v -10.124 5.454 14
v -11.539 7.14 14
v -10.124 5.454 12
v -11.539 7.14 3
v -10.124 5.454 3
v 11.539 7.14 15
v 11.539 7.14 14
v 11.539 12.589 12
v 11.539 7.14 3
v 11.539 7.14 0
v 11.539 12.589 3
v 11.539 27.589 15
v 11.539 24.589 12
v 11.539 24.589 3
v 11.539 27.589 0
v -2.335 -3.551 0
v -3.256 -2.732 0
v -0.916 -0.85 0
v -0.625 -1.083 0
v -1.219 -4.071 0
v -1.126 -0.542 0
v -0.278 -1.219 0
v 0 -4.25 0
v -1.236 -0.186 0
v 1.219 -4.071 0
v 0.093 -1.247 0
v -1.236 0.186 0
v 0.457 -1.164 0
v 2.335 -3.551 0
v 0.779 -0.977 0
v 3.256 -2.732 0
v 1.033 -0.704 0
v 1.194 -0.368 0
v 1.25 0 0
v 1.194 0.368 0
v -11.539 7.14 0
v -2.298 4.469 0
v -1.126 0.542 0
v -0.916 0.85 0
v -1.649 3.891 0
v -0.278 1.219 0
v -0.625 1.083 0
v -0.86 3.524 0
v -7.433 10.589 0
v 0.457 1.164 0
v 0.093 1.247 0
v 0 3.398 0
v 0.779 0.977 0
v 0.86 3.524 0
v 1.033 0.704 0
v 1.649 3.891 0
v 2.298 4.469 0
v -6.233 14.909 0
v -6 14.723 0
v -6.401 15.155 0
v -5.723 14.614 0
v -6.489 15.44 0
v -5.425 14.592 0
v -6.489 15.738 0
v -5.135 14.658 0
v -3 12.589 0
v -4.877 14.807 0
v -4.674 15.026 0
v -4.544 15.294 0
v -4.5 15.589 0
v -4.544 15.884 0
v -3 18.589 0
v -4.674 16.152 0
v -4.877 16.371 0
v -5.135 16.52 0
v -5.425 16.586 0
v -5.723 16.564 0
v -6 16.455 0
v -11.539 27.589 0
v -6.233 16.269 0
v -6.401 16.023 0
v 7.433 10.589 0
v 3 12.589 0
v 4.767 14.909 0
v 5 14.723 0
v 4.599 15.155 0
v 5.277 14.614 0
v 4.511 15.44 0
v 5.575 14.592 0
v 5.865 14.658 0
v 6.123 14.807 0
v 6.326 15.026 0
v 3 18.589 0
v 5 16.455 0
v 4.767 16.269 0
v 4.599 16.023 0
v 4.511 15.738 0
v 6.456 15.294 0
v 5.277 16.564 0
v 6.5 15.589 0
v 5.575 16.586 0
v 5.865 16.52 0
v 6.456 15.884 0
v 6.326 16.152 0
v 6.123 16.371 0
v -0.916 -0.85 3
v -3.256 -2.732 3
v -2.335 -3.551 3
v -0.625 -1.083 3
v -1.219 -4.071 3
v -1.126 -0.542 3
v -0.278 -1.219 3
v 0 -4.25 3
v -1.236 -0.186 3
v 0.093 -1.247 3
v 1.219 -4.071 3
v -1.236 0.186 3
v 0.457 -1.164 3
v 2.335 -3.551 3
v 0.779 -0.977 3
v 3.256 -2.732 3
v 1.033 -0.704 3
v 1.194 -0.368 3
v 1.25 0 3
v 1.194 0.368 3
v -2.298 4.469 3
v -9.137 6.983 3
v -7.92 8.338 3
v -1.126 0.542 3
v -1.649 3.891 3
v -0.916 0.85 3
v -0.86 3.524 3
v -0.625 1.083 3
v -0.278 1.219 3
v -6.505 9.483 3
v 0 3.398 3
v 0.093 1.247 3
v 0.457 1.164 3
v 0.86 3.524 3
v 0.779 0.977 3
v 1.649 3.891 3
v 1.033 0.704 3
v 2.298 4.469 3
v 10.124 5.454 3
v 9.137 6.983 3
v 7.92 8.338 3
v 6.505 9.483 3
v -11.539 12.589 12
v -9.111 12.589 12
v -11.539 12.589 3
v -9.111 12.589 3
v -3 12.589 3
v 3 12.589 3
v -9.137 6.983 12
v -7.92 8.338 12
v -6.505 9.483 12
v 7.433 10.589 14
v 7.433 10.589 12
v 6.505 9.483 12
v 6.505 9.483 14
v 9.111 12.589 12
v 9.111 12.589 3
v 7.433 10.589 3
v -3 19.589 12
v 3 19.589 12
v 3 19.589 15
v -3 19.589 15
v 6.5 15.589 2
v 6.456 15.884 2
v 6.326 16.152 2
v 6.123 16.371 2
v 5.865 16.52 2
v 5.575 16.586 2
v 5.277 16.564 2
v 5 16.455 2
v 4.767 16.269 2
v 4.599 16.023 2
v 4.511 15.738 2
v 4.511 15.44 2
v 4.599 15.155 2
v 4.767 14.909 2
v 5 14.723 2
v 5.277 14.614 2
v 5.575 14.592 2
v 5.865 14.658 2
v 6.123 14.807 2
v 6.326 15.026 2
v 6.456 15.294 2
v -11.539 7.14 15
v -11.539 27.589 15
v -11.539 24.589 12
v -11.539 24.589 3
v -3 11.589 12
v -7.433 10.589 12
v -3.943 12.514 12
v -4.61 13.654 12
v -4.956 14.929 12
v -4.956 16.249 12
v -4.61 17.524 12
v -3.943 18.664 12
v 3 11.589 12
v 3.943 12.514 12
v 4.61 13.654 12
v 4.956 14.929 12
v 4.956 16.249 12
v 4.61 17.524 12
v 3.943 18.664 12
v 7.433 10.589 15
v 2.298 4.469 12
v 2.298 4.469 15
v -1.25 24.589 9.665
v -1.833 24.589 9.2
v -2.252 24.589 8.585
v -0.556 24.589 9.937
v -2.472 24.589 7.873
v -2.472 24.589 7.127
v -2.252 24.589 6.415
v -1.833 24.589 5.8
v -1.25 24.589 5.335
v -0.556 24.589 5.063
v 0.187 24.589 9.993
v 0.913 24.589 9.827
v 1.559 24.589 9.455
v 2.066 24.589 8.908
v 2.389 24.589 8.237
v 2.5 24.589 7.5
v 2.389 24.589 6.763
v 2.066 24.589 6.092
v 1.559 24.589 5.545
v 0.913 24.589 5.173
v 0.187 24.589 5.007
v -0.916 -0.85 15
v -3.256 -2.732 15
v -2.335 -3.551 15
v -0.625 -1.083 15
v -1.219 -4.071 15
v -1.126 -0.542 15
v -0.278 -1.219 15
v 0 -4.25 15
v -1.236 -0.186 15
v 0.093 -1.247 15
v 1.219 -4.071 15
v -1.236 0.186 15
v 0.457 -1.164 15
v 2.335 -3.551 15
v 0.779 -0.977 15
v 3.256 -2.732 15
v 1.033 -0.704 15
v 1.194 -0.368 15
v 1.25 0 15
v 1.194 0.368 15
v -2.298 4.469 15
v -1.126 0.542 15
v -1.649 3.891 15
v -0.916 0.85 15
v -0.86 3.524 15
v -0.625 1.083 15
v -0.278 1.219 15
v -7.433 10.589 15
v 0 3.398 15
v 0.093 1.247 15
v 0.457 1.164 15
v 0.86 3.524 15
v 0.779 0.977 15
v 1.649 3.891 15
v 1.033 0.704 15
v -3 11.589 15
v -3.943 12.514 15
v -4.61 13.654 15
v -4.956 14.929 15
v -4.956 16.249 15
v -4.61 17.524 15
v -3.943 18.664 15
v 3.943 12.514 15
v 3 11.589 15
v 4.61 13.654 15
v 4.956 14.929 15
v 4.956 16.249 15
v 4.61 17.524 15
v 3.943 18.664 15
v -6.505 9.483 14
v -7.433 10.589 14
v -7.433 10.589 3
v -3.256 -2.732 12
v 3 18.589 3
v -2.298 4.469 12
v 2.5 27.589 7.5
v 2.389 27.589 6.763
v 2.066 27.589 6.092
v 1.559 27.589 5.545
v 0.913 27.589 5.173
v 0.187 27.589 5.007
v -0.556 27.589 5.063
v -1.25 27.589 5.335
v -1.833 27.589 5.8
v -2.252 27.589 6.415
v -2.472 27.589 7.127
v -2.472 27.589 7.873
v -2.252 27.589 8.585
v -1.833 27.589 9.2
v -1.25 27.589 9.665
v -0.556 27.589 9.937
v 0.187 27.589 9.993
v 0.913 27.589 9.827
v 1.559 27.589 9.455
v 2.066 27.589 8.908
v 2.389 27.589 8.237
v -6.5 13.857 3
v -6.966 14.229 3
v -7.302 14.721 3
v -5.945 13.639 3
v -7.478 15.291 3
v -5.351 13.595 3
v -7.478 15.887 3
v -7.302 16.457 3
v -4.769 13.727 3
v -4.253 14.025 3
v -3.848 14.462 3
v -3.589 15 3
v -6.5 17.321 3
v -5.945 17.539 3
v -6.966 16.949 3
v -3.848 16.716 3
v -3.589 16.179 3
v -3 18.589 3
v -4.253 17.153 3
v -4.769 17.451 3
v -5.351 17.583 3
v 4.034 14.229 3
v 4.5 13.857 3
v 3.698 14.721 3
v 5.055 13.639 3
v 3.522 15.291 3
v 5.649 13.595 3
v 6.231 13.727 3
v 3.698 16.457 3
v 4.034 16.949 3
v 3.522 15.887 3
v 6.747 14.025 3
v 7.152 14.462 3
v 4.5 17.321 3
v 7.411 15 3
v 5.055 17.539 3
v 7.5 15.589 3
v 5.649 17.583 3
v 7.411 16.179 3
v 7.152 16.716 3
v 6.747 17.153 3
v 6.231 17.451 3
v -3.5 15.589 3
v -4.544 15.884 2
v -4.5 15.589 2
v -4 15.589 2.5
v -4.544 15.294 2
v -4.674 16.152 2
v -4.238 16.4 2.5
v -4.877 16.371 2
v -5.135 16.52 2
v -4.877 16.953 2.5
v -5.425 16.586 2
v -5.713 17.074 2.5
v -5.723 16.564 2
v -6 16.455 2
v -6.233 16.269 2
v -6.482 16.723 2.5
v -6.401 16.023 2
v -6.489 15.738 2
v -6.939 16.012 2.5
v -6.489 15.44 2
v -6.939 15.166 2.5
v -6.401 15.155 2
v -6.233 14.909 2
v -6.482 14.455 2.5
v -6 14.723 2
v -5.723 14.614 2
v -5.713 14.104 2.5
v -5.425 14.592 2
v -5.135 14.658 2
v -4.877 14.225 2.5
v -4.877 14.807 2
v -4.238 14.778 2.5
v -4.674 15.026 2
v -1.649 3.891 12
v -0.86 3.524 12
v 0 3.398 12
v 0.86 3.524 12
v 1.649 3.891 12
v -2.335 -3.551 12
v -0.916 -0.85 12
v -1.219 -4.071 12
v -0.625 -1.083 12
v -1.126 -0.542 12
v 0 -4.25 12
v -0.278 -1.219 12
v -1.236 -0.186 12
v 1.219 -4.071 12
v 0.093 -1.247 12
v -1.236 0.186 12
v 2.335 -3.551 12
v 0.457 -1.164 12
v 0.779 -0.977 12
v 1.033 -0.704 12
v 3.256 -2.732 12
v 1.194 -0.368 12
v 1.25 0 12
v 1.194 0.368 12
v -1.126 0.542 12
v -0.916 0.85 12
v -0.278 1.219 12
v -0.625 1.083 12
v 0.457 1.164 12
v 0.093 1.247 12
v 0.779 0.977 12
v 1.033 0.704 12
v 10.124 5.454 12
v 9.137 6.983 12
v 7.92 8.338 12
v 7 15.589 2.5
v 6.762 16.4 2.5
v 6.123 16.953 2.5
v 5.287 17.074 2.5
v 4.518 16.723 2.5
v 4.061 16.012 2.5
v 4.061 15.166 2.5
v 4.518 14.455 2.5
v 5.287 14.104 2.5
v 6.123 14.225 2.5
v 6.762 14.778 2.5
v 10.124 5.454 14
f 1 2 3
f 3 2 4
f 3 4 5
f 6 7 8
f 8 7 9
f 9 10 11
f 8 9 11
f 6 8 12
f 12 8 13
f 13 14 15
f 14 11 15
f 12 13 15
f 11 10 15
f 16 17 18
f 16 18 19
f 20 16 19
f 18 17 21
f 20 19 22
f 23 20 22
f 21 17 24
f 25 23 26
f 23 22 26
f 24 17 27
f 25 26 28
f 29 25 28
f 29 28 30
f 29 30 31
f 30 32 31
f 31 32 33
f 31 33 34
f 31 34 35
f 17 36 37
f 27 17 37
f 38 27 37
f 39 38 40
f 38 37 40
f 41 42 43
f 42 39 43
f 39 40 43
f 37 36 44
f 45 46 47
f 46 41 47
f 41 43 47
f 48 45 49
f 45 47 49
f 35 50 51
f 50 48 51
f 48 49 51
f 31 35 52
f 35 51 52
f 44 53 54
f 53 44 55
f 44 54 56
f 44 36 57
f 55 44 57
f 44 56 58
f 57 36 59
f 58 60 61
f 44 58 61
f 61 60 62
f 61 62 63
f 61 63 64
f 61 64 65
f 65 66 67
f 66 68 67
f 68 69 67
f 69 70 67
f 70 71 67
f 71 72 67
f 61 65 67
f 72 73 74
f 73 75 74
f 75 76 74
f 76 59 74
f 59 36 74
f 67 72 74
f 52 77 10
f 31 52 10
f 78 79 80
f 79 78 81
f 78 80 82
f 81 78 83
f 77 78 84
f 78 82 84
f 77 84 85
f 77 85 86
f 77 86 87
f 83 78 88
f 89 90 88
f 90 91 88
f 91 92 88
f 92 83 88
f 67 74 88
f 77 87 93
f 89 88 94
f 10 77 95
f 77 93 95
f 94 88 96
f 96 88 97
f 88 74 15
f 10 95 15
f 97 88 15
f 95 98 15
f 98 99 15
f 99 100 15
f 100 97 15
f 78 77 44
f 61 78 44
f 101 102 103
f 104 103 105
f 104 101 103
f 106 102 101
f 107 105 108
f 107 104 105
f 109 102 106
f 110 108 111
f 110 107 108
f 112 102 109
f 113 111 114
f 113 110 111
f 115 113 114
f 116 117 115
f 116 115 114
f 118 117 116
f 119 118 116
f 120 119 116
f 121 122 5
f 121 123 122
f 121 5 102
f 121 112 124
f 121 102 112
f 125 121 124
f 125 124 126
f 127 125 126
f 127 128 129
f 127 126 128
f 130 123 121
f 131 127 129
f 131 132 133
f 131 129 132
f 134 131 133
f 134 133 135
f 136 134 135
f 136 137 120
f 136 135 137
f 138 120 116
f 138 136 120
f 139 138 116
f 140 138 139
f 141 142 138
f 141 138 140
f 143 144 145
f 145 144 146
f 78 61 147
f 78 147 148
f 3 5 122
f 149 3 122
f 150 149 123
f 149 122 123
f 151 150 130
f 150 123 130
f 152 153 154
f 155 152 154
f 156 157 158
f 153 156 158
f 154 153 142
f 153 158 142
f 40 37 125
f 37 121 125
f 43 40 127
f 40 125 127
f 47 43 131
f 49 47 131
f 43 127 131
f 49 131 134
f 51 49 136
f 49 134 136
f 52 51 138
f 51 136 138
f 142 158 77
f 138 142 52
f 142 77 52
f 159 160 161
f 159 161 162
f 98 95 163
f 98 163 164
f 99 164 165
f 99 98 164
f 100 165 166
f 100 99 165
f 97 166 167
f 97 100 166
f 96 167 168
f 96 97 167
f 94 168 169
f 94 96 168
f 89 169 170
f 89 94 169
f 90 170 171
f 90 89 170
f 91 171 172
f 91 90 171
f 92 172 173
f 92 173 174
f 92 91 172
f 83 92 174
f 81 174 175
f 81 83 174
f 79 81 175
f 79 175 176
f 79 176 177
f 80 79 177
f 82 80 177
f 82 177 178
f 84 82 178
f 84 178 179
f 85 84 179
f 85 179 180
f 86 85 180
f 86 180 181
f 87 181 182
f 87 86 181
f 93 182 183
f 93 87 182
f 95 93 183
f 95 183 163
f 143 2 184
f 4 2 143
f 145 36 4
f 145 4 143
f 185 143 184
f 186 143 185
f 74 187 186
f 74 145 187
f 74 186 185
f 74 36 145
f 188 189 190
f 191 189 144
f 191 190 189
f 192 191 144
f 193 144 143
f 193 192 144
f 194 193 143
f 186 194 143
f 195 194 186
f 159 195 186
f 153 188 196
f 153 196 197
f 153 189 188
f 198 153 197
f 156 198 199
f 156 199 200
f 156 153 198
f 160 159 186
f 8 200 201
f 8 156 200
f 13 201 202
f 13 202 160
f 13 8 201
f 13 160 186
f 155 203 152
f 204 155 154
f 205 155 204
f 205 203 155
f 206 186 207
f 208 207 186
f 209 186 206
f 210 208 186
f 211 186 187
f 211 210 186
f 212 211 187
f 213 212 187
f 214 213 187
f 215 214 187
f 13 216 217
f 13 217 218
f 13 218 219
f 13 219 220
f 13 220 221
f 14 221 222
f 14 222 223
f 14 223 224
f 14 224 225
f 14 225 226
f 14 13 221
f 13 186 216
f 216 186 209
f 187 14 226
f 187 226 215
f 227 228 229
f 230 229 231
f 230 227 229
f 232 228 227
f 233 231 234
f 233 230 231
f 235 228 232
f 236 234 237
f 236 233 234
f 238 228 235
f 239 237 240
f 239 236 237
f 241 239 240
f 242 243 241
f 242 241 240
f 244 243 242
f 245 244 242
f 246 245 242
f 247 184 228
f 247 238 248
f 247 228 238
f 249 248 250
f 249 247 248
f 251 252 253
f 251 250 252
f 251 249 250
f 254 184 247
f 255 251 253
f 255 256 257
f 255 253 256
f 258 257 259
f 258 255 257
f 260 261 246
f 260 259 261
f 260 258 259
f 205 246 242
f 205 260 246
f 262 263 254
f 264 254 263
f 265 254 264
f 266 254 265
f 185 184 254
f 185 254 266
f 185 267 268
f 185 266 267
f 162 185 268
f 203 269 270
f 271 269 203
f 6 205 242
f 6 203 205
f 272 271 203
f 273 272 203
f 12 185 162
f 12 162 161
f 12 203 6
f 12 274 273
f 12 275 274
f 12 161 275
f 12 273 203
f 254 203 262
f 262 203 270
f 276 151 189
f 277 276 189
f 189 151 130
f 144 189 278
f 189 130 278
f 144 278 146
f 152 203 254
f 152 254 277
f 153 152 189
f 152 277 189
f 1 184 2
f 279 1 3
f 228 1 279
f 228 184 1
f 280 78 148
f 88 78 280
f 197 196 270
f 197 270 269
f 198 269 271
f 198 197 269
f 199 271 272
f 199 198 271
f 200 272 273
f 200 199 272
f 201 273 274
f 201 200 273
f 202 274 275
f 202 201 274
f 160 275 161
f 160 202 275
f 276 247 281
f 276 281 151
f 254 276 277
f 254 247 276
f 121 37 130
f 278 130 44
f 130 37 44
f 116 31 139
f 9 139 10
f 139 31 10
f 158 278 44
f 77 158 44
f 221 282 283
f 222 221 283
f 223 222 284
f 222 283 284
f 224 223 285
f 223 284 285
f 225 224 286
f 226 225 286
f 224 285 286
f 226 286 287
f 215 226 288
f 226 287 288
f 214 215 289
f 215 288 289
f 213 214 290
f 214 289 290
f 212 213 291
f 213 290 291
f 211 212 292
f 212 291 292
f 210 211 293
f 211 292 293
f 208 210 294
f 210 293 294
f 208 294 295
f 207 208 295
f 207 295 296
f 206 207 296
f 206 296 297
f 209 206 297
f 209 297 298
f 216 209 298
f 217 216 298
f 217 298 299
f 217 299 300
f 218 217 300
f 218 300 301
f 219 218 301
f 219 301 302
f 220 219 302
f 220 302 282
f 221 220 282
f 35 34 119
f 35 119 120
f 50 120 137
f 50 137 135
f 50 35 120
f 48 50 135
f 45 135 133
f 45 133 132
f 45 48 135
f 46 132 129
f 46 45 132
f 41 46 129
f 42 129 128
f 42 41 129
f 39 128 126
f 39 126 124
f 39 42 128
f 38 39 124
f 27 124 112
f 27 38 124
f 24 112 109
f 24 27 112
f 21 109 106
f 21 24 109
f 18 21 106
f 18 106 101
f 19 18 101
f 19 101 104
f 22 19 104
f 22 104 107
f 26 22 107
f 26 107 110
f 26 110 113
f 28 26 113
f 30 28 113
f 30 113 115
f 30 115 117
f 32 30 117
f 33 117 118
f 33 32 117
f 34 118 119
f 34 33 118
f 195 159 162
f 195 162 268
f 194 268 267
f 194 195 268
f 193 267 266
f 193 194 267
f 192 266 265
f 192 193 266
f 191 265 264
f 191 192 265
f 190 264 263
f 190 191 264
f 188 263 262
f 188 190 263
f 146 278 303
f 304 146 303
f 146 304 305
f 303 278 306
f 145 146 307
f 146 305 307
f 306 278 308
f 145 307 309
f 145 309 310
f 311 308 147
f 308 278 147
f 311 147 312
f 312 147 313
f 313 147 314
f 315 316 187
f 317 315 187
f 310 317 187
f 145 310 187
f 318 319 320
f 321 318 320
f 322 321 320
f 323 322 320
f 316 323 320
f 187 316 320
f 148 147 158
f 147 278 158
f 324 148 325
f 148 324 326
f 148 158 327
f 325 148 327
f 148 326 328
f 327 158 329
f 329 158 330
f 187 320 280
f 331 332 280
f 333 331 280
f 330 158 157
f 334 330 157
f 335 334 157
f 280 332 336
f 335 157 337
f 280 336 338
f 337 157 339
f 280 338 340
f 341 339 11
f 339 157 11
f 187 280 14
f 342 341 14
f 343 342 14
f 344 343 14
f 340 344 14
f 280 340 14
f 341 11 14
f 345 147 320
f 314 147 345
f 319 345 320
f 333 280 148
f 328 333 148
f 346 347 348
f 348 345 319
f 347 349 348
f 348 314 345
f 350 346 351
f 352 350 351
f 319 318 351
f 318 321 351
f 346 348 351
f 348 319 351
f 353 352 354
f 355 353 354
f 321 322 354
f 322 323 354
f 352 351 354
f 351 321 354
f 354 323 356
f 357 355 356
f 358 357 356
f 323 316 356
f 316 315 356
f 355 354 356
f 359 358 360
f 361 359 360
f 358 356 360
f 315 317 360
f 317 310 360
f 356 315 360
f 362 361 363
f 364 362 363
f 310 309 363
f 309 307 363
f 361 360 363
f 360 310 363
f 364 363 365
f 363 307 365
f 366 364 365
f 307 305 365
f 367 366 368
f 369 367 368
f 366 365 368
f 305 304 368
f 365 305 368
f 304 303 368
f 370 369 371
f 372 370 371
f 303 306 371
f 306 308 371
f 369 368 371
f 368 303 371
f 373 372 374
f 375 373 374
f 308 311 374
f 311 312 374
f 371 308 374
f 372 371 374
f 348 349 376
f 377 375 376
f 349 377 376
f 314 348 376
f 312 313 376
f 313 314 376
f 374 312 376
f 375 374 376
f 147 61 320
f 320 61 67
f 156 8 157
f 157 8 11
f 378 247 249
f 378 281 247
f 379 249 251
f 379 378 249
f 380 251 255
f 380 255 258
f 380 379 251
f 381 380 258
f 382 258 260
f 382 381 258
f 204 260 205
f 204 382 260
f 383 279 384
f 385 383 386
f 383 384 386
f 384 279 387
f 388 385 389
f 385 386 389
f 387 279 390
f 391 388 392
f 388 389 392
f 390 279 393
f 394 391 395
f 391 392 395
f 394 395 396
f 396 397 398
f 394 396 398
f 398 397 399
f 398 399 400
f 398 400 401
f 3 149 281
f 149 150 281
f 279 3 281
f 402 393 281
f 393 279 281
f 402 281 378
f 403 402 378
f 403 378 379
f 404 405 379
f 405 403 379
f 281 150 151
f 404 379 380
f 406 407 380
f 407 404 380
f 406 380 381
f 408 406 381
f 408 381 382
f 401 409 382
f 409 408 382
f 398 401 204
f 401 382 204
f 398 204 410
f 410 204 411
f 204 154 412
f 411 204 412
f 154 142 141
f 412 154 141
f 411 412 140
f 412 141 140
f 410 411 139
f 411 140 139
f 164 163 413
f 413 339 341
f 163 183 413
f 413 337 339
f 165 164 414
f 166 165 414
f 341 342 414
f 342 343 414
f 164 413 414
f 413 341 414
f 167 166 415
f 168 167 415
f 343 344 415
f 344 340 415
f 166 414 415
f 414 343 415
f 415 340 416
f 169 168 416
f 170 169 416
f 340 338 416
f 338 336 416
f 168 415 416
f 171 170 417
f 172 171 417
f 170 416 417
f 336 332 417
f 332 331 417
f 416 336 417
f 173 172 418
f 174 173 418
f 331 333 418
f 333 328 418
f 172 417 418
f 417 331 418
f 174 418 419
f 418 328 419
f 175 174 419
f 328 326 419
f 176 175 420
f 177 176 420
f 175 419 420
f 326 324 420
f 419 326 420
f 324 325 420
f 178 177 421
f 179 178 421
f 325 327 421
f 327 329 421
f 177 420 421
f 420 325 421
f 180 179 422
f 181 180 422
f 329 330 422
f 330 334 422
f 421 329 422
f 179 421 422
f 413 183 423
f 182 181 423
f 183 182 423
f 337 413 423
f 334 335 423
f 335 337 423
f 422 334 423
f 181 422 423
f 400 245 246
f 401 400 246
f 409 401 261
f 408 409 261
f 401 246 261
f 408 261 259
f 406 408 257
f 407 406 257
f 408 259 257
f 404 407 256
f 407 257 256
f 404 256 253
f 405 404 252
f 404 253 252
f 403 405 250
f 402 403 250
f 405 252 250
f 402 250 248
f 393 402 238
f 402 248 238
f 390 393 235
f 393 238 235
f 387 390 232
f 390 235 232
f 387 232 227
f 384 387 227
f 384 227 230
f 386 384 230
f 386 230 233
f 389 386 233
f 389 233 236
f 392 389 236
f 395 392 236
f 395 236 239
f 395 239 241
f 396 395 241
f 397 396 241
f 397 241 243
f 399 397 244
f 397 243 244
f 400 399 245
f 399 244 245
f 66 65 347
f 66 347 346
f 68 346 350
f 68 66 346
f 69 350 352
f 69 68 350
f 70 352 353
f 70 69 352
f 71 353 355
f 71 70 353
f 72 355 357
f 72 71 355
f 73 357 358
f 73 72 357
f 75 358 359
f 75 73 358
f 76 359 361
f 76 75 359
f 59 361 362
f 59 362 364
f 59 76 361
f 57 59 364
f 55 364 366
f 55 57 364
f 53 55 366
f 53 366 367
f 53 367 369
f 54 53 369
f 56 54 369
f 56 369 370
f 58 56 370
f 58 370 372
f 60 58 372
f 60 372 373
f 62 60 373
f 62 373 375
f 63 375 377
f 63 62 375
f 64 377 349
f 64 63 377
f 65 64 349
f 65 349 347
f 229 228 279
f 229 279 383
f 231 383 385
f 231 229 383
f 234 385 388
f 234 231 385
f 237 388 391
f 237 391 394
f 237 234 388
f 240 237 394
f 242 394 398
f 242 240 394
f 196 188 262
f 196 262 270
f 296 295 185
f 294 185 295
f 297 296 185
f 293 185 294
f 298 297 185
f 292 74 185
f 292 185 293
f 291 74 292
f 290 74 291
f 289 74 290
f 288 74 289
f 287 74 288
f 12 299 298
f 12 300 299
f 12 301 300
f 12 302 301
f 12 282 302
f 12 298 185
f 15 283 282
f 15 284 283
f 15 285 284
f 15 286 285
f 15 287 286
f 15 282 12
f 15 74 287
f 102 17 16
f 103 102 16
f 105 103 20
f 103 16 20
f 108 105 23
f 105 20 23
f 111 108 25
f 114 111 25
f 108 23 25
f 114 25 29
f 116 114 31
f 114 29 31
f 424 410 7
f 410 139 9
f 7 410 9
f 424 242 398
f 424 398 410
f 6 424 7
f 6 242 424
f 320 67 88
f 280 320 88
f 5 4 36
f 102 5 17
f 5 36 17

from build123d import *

# Parameters (mm, degrees)
SKETCH1_R           = 1.25
BOSS_EXTRUDE1_DEPTH = 3
BOSS_EXTRUDE2_DEPTH = 14
FILLET1_R           = 1
FILLET3_R           = 3
CUT_EXTRUDE1_DEPTH  = 15
SKETCH8_W           = 23.078375234
SKETCH8_H           = 15
BOSS_EXTRUDE6_DEPTH = 15
SKETCH9_W           = 9
SKETCH9_H           = 12
CUT_EXTRUDE4_DEPTH  = 12.5
SKETCH10_W          = 3
SKETCH10_H          = 2
BOSS_EXTRUDE8_DEPTH = 11.5
CUT_EXTRUDE5_START  = 12
CUT_EXTRUDE5_DEPTH  = 3
SKETCH12_R          = 1
SKETCH12_W          = 6
SKETCH12_H          = 6
CUT_EXTRUDE6_DEPTH  = 3
CUT_EXTRUDE7_START  = 27.589042
SKETCH13_R          = 2.5
CUT_EXTRUDE7_DEPTH  = 4
CHAMFER1_SIZE       = 1


with BuildPart() as part:
    # Sketch1 → Boss-Extrude1 (new body)
    with BuildSketch(Plane.XY):
        with BuildLine():
            Line((-16.111441077, 12.589041521), (-3.255688883, -2.731847341))
            ThreePointArc((-3.255688883, -2.731847341), (0, -4.25), (3.255688883, -2.731847341))
            Line((3.255688883, -2.731847341), (16.111441077, 12.589041521))
            Line((16.111441077, 12.589041521), (9.111441077, 12.589041521))
            Line((9.111441077, 12.589041521), (0, 1.730448884))
            Line((0, 1.730448884), (-9.111441077, 12.589041521))
            Line((-9.111441077, 12.589041521), (-16.111441077, 12.589041521))
        make_face()
        Circle(SKETCH1_R, mode=Mode.SUBTRACT)
    boss_extrude1 = extrude(amount=BOSS_EXTRUDE1_DEPTH)

    # Sketch2 → Boss-Extrude2 (add)
    with BuildSketch(Plane.XY):
        with BuildLine():
            Line((16.111441077, 12.589041521), (9.111441077, 12.589041521))
            Line((9.111441077, 12.589041521), (6.505319132, 9.483186331))
            ThreePointArc((6.505319132, 9.483186331), (8.555448033, 7.684680147), (10.124424164, 5.453992606))
            Line((10.124424164, 5.453992606), (16.111441077, 12.589041521))
        make_face()
        with BuildLine():
            Line((-9.111441077, 12.589041521), (-16.111441077, 12.589041521))
            Line((-16.111441077, 12.589041521), (-10.124424164, 5.453992606))
            ThreePointArc((-10.124424164, 5.453992606), (-8.555448033, 7.684680147), (-6.505319132, 9.483186331))
            Line((-6.505319132, 9.483186331), (-9.111441077, 12.589041521))
        make_face()
    extrude(amount=BOSS_EXTRUDE2_DEPTH)

    # Mirror1: Boss-Extrude1 across plane
    add(boss_extrude1.mirror(Plane(origin=(0, 0, 7.5), x_dir=(1, 0, 0), z_dir=(0, 0, -1))))

    # Fillet1
    fillet1_edges = [part.edges().sort_by_distance(p)[0] for p in [
        (16.111441077, 12.589041521, 7.5),
        (-16.111441077, 12.589041521, 7.5),
    ]]
    fillet(fillet1_edges, radius=FILLET1_R)

    # Fillet3
    fillet3_edges = [part.edges().sort_by_distance(p)[0] for p in [
        (0, 1.730448884, 1.5),
        (0, 1.730448884, 13.5),
    ]]
    fillet(fillet3_edges, radius=FILLET3_R)

    # Sketch5 → Cut-Extrude1 (cut)
    with BuildSketch(Plane.XY):
        Polygon((11.539187617, 12.589041521), (11.539187617, 7.140042034), (16.111441077, 12.589041521), align=None)
        Polygon((-11.539187617, 12.589041521), (-11.539187617, 7.140042034), (-16.111441077, 12.589041521), align=None)
    extrude(amount=CUT_EXTRUDE1_DEPTH, mode=Mode.SUBTRACT)

    # Sketch8 → Boss-Extrude6 (add)
    with BuildSketch(Plane.XY):
        with Locations((0, 20.089041521)):
            Rectangle(SKETCH8_W, SKETCH8_H)
    extrude(amount=BOSS_EXTRUDE6_DEPTH)

    # Sketch9 → Cut-Extrude4 (cut, symmetric)
    with BuildSketch(Plane(origin=(0, 0, 0), x_dir=(0, 0, -1), z_dir=(1, 0, 0))):
        with Locations((-7.5, 18.589041521)):
            Rectangle(SKETCH9_W, SKETCH9_H)
    extrude(amount=CUT_EXTRUDE4_DEPTH, both=True, mode=Mode.SUBTRACT)

    # Sketch10 → Boss-Extrude8 (add, symmetric)
    with BuildSketch(Plane(origin=(0, 0, 0), x_dir=(0, 0, -1), z_dir=(1, 0, 0))):
        with Locations((-13.5, 11.589041521)):
            Rectangle(SKETCH10_W, SKETCH10_H)
        with Locations((-1.5, 11.589041521)):
            Rectangle(SKETCH10_W, SKETCH10_H)
    extrude(amount=BOSS_EXTRUDE8_DEPTH, both=True)

    # Sketch11 → Cut-Extrude5 (cut)
    with BuildSketch(Plane.XY.offset(CUT_EXTRUDE5_START)):
        with BuildLine():
            Line((-3, 11.589041521), (3, 11.589041521))
            ThreePointArc((3, 11.589041521), (5, 15.589041521), (3, 19.589041521))
            Line((3, 19.589041521), (-3, 19.589041521))
            ThreePointArc((-3, 19.589041521), (-5, 15.589041521), (-3, 11.589041521))
        make_face()
    extrude(amount=CUT_EXTRUDE5_DEPTH, mode=Mode.SUBTRACT)

    # Sketch12 → Cut-Extrude6 (cut)
    with BuildSketch(Plane.XY):
        with Locations((5.5, 15.589041521)):
            Circle(SKETCH12_R)
        with Locations((-5.5, 15.589041521)):
            Circle(SKETCH12_R)
        with Locations((0, 15.589041521)):
            Rectangle(SKETCH12_W, SKETCH12_H)
    extrude(amount=CUT_EXTRUDE6_DEPTH, mode=Mode.SUBTRACT)

    # Sketch13 → Cut-Extrude7 (cut)
    with BuildSketch(Plane(origin=(0, 0, 0), x_dir=(1, 0, 0), z_dir=(0, 1, 0)).offset(CUT_EXTRUDE7_START)):
        with Locations((0, -7.5)):
            Circle(SKETCH13_R)
    extrude(amount=-CUT_EXTRUDE7_DEPTH, mode=Mode.SUBTRACT)

    # Chamfer1
    chamfer1_edges = [part.edges().sort_by_distance(p)[0] for p in [
        (-6.5, 15.589041521, 3),
        (4.5, 15.589041521, 3),
    ]]
    chamfer(chamfer1_edges, length=CHAMFER1_SIZE)


solid = part.part
